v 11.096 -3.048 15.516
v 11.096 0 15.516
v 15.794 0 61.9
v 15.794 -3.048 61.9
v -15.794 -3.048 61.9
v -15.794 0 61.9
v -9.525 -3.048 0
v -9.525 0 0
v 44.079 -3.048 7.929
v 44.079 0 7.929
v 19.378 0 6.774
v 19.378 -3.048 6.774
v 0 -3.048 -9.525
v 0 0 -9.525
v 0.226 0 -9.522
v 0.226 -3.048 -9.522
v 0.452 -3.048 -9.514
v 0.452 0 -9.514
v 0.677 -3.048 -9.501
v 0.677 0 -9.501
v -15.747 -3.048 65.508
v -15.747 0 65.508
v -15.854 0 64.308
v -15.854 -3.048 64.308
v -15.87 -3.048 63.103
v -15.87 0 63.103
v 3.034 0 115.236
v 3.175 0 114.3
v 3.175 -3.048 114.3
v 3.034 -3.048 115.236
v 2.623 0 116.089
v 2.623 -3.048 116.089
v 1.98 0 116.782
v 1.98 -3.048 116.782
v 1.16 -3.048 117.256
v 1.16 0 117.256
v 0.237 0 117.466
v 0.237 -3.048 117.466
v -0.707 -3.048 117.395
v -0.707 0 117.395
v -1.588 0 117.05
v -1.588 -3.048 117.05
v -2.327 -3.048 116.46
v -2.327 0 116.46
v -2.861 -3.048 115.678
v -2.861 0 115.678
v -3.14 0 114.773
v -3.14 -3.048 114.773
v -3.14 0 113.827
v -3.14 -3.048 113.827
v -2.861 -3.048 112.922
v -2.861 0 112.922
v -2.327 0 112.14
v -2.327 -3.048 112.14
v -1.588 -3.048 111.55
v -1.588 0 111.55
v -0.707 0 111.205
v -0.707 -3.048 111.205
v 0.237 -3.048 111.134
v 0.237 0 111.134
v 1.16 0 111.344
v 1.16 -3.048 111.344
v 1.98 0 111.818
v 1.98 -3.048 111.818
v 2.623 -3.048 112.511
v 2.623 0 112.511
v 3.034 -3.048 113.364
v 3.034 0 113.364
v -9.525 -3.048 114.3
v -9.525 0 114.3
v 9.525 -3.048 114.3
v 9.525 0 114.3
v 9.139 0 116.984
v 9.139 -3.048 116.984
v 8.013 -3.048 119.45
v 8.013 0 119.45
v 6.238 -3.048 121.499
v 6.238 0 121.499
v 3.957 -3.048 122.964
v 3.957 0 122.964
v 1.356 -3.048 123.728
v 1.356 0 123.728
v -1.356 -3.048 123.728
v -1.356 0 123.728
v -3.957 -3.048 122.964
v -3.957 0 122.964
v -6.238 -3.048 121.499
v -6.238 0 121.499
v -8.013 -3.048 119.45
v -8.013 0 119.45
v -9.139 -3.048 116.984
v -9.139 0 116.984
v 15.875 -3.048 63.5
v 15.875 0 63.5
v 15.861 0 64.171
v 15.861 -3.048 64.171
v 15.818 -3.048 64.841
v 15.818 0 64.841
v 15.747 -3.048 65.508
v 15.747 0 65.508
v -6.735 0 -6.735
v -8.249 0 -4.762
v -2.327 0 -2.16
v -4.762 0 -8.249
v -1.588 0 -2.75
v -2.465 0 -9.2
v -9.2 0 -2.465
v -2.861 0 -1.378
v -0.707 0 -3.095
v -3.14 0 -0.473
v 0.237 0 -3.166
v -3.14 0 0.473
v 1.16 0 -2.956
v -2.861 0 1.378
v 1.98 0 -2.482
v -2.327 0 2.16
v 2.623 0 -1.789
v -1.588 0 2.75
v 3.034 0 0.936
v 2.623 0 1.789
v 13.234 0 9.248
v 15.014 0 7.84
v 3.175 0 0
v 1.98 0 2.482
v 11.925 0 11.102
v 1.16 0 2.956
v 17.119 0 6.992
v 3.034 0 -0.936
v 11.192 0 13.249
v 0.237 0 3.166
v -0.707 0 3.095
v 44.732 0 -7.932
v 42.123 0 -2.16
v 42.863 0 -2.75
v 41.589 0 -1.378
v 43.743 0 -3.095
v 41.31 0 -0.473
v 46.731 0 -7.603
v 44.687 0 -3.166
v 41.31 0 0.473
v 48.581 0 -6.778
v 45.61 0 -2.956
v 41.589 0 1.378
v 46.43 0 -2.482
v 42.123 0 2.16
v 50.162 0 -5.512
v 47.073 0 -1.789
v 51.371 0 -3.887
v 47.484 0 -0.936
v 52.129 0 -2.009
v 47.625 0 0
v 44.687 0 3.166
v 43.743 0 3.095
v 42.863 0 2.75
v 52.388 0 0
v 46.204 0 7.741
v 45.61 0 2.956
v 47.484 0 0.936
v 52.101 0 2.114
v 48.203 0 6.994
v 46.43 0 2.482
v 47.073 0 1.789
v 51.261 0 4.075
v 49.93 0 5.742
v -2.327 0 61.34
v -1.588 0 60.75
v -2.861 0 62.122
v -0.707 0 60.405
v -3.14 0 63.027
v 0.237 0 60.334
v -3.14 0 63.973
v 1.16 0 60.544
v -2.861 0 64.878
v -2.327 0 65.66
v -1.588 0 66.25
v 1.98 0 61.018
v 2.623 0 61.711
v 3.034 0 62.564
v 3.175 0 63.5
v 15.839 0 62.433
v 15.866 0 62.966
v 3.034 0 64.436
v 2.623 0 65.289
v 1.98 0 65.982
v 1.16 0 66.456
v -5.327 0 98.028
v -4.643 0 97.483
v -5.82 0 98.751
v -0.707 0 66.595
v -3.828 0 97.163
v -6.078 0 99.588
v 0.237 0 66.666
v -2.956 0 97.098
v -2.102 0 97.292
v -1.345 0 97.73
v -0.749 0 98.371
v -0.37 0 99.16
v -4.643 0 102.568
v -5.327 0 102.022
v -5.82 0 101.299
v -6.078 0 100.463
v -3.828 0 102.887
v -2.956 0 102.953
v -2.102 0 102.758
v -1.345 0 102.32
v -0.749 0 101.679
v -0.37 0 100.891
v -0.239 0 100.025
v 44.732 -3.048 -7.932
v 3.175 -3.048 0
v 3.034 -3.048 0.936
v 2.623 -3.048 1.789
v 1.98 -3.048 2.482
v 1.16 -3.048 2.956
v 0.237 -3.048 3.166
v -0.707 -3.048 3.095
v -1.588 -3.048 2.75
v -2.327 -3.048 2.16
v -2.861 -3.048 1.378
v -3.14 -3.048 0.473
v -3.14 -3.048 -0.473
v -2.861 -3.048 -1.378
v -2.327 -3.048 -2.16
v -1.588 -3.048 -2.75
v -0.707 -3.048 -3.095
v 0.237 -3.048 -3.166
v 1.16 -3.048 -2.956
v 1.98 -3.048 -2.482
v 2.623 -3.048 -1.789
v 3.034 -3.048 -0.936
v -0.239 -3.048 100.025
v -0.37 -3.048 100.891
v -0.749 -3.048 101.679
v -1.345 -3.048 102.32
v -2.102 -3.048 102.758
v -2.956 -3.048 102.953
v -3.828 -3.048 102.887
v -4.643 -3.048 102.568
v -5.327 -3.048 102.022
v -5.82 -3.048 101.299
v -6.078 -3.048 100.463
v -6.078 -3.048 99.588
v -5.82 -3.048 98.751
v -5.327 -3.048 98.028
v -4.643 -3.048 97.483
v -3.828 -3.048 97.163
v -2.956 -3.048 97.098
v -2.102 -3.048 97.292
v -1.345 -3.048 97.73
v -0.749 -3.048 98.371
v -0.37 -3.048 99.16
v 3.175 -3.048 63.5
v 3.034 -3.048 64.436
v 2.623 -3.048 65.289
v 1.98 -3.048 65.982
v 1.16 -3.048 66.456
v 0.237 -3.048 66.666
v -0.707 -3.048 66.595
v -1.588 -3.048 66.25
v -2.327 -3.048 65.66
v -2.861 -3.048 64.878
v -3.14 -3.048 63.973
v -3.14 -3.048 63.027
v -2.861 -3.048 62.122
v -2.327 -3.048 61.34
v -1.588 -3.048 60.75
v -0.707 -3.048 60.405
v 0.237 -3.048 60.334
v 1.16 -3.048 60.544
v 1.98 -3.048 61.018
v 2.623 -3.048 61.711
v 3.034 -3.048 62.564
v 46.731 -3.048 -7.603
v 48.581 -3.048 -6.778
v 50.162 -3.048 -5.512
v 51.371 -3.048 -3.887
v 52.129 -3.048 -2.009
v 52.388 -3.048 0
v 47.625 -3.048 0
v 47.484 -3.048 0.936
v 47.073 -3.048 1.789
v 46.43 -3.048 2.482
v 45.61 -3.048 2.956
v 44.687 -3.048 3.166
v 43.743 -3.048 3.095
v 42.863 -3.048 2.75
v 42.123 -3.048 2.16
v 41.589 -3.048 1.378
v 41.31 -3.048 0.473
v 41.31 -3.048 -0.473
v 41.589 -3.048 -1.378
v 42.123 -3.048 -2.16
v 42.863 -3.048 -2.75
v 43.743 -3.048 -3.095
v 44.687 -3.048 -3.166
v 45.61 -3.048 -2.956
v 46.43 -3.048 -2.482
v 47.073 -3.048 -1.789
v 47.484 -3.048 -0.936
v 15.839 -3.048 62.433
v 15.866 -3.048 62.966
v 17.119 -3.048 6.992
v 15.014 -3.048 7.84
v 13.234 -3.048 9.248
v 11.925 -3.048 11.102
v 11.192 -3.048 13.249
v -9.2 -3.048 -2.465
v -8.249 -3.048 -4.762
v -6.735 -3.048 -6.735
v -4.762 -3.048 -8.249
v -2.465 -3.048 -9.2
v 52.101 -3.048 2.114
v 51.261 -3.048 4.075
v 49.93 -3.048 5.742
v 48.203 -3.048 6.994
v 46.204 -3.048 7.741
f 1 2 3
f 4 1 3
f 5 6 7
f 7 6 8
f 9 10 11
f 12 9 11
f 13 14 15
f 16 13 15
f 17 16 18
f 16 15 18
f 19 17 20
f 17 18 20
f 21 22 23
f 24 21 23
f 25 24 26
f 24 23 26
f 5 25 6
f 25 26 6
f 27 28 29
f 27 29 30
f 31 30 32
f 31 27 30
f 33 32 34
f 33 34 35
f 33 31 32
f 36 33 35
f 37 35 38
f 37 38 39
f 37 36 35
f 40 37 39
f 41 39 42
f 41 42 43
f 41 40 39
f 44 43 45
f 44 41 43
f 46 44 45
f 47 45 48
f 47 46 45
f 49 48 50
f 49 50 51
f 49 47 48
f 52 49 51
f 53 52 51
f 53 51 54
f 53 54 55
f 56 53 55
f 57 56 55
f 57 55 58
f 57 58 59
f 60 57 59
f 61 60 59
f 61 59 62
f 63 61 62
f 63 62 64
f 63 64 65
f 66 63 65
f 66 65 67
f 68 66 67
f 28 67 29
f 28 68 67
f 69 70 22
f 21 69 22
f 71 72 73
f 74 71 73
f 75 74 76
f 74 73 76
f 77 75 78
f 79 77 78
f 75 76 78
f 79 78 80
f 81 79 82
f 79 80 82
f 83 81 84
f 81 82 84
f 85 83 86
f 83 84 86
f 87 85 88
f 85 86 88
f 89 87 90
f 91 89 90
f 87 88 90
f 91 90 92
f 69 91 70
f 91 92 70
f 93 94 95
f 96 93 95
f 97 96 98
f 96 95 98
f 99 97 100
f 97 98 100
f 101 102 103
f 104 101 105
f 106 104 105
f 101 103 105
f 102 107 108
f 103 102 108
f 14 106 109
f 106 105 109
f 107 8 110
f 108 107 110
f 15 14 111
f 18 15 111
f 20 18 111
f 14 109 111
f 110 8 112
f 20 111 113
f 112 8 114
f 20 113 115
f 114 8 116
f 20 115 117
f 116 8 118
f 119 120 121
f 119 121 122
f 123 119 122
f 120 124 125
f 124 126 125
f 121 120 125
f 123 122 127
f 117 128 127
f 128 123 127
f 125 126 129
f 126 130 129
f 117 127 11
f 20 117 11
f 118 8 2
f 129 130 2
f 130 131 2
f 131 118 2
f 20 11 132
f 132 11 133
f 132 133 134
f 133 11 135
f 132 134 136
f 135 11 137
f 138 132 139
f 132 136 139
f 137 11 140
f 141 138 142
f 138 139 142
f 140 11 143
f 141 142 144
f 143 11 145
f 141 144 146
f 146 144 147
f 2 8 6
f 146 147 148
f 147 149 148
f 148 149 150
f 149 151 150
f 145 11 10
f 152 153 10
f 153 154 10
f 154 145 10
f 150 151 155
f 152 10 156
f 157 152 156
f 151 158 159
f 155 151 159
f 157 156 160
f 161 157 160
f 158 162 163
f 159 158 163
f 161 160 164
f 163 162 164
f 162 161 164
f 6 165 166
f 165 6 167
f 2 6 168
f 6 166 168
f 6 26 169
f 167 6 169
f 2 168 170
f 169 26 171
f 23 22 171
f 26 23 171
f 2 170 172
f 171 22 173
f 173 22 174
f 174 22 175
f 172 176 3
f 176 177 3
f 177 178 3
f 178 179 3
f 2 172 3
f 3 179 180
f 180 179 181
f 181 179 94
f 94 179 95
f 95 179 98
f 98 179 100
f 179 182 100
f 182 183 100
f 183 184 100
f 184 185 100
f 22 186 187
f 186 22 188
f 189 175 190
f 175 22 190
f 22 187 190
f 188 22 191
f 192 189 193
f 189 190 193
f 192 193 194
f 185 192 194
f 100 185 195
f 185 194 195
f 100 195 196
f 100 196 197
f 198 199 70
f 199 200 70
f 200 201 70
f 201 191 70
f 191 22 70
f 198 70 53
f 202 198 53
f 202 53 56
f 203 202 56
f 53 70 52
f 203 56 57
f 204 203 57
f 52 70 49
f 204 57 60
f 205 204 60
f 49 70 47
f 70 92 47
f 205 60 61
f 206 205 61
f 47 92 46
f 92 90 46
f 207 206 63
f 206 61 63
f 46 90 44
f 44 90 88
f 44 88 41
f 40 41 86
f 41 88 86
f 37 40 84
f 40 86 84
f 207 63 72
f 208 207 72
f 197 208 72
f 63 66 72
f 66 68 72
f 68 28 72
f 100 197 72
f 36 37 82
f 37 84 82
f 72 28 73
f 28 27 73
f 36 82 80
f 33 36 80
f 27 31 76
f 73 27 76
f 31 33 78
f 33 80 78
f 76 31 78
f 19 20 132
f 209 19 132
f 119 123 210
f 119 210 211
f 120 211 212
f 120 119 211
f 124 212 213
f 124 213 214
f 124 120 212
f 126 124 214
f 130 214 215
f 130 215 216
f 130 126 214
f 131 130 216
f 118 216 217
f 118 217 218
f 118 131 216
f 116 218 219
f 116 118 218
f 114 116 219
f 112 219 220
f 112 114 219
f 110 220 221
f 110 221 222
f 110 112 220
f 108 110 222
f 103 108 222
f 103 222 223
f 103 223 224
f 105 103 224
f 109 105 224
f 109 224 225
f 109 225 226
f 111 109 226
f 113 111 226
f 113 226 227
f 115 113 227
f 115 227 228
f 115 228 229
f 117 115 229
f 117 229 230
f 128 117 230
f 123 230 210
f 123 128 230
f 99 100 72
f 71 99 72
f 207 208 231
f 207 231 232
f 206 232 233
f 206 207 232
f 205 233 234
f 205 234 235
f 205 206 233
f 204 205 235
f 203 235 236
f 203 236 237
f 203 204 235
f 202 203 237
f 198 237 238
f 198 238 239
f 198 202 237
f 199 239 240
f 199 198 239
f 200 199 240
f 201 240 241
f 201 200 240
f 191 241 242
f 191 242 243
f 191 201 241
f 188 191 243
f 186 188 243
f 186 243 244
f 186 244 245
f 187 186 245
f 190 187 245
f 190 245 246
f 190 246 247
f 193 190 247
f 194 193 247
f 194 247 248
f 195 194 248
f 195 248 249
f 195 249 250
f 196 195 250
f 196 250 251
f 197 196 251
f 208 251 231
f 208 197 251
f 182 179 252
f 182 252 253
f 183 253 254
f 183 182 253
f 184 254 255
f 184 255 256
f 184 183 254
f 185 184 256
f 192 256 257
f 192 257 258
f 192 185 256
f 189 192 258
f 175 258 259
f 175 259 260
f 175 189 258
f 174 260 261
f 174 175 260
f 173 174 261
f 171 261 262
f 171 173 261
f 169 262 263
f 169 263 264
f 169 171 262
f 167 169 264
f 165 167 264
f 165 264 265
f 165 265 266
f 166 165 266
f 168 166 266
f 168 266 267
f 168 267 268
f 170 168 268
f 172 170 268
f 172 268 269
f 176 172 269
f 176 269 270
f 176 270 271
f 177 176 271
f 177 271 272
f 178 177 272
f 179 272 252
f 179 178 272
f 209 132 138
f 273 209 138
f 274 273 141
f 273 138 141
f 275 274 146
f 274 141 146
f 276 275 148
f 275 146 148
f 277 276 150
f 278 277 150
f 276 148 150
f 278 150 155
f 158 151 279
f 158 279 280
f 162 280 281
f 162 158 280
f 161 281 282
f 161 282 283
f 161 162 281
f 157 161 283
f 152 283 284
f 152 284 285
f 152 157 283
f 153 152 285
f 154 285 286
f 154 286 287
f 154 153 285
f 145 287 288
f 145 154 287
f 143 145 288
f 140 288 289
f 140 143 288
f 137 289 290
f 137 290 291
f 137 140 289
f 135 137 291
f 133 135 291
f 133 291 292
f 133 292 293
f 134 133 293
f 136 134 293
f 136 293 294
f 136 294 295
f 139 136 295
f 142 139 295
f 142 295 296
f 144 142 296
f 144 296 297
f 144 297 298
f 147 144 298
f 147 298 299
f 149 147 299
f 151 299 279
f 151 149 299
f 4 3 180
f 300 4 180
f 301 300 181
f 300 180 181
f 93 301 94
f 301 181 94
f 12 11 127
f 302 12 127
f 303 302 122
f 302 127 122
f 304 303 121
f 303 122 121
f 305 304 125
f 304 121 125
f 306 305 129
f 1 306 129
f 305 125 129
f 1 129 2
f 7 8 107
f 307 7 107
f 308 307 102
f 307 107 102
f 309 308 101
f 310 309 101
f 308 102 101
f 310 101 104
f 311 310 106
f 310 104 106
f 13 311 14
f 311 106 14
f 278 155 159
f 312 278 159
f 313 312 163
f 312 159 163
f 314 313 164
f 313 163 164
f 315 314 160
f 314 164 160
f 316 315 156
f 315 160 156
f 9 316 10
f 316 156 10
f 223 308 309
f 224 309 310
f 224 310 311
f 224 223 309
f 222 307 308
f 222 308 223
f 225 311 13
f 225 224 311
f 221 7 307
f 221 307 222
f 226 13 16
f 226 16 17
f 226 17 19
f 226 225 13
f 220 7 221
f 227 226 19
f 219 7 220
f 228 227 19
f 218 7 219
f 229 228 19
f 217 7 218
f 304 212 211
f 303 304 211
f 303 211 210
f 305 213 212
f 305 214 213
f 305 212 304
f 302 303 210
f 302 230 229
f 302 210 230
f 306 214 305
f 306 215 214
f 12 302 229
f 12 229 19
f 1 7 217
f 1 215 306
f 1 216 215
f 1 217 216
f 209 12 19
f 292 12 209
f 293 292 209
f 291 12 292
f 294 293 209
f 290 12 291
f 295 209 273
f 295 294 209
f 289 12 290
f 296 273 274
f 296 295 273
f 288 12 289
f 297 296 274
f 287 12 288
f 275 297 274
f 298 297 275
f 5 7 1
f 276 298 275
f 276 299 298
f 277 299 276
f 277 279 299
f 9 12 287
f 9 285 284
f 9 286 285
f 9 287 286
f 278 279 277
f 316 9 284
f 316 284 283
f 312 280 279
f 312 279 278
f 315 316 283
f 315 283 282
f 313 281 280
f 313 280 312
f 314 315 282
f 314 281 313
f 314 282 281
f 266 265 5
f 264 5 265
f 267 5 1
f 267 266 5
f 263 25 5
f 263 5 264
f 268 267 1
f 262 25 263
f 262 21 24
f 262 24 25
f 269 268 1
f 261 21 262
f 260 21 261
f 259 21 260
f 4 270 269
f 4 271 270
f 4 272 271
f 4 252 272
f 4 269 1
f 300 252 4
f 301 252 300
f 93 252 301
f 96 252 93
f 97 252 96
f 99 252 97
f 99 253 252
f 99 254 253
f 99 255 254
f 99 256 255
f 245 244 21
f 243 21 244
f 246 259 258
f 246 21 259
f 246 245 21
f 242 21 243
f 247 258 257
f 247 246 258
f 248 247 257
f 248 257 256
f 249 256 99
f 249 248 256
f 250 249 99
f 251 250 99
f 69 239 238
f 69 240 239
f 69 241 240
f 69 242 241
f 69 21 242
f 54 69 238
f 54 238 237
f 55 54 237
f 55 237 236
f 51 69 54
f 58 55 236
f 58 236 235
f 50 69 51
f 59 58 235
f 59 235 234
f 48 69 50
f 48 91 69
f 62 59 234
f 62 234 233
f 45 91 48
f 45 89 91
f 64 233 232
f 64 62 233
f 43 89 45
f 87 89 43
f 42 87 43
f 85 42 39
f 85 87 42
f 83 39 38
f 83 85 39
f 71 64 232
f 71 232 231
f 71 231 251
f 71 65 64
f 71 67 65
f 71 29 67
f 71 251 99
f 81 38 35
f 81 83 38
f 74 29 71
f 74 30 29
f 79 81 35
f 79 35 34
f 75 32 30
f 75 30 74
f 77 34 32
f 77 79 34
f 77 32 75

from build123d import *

# Parameters (mm, degrees)
F0_R     = 3.175
F0_R_2   = 2.935696
F1_DEPTH = 3.048


with BuildPart() as f1:
    # F0 (on Front) → F1 (new body)
    with BuildSketch(Plane.XZ):
        with BuildLine():
            ThreePointArc((0.677344, -9.500886), (6.970557, -6.491299), (9.525, 0))
            ThreePointArc((9.525, 0), (0, 9.525), (-9.525, 0))
            ThreePointArc((-9.525, 0), (-6.735192, -6.735192), (0, -9.525))
            Line((0, -9.525), (0.677344, -9.500886))
        make_face()
        Circle(F0_R, mode=Mode.SUBTRACT)
        with BuildLine():
            ThreePointArc((-9.525, 0), (0, 9.525), (9.525, 0))
            ThreePointArc((9.525, 0), (6.970557, -6.491299), (0.677344, -9.500886))
            Line((0.677344, -9.500886), (44.732405, -7.932475))
            ThreePointArc((44.732405, -7.932475), (36.519221, -0.326571), (44.079274, 7.928838))
            Line((44.079274, 7.928838), (19.377548, 6.773866))
            ThreePointArc((19.377548, 6.773866), (13.234292, 9.248177), (11.096492, 15.51648))
            Line((11.096492, 15.51648), (15.794203, 61.90038))
            ThreePointArc((15.794203, 61.90038), (0, 47.625), (-15.794203, 61.90038))
            Line((-15.794203, 61.90038), (-9.525, 0))
        make_face()
        with BuildLine():
            ThreePointArc((0, -9.525), (0.338886, -9.51897), (0.677344, -9.500886))
            Line((0.677344, -9.500886), (0, -9.525))
        make_face()
        with BuildLine():
            ThreePointArc((-15.747457, 65.508289), (-15.873668, 63.705667), (-15.794203, 61.90038))
            ThreePointArc((-15.794203, 61.90038), (0, 47.625), (15.794203, 61.90038))
            ThreePointArc((15.794203, 61.90038), (15.854788, 62.699171), (15.875, 63.5))
            ThreePointArc((15.875, 63.5), (15.843082, 64.506168), (15.747457, 65.508289))
            ThreePointArc((15.747457, 65.508289), (0, 79.375), (-15.747457, 65.508289))
        make_face()
        with Locations((0, 63.5)):
            Circle(F0_R, mode=Mode.SUBTRACT)
        with BuildLine():
            ThreePointArc((44.079274, 7.928838), (36.519221, -0.326571), (44.732405, -7.932475))
            ThreePointArc((44.732405, -7.932475), (50.161633, -5.51191), (52.3875, 0))
            ThreePointArc((52.3875, 0), (49.930021, 5.742236), (44.079274, 7.928838))
        make_face()
        with Locations((44.45, 0)):
            Circle(F0_R, mode=Mode.SUBTRACT)
        with BuildLine():
            Line((-9.525, 114.3), (-15.747457, 65.508289))
            ThreePointArc((-15.747457, 65.508289), (0, 79.375), (15.747457, 65.508289))
            Line((15.747457, 65.508289), (9.525, 114.3))
            ThreePointArc((9.525, 114.3), (0, 104.775), (-9.525, 114.3))
        make_face()
        with Locations((-3.175, 100.0252)):
            Circle(F0_R_2, mode=Mode.SUBTRACT)
        with BuildLine():
            ThreePointArc((9.525, 114.3), (0, 123.825), (-9.525, 114.3))
            ThreePointArc((-9.525, 114.3), (0, 104.775), (9.525, 114.3))
        make_face()
        with Locations((0, 114.3)):
            Circle(F0_R, mode=Mode.SUBTRACT)
    extrude(amount=F1_DEPTH)


solid = f1.part
